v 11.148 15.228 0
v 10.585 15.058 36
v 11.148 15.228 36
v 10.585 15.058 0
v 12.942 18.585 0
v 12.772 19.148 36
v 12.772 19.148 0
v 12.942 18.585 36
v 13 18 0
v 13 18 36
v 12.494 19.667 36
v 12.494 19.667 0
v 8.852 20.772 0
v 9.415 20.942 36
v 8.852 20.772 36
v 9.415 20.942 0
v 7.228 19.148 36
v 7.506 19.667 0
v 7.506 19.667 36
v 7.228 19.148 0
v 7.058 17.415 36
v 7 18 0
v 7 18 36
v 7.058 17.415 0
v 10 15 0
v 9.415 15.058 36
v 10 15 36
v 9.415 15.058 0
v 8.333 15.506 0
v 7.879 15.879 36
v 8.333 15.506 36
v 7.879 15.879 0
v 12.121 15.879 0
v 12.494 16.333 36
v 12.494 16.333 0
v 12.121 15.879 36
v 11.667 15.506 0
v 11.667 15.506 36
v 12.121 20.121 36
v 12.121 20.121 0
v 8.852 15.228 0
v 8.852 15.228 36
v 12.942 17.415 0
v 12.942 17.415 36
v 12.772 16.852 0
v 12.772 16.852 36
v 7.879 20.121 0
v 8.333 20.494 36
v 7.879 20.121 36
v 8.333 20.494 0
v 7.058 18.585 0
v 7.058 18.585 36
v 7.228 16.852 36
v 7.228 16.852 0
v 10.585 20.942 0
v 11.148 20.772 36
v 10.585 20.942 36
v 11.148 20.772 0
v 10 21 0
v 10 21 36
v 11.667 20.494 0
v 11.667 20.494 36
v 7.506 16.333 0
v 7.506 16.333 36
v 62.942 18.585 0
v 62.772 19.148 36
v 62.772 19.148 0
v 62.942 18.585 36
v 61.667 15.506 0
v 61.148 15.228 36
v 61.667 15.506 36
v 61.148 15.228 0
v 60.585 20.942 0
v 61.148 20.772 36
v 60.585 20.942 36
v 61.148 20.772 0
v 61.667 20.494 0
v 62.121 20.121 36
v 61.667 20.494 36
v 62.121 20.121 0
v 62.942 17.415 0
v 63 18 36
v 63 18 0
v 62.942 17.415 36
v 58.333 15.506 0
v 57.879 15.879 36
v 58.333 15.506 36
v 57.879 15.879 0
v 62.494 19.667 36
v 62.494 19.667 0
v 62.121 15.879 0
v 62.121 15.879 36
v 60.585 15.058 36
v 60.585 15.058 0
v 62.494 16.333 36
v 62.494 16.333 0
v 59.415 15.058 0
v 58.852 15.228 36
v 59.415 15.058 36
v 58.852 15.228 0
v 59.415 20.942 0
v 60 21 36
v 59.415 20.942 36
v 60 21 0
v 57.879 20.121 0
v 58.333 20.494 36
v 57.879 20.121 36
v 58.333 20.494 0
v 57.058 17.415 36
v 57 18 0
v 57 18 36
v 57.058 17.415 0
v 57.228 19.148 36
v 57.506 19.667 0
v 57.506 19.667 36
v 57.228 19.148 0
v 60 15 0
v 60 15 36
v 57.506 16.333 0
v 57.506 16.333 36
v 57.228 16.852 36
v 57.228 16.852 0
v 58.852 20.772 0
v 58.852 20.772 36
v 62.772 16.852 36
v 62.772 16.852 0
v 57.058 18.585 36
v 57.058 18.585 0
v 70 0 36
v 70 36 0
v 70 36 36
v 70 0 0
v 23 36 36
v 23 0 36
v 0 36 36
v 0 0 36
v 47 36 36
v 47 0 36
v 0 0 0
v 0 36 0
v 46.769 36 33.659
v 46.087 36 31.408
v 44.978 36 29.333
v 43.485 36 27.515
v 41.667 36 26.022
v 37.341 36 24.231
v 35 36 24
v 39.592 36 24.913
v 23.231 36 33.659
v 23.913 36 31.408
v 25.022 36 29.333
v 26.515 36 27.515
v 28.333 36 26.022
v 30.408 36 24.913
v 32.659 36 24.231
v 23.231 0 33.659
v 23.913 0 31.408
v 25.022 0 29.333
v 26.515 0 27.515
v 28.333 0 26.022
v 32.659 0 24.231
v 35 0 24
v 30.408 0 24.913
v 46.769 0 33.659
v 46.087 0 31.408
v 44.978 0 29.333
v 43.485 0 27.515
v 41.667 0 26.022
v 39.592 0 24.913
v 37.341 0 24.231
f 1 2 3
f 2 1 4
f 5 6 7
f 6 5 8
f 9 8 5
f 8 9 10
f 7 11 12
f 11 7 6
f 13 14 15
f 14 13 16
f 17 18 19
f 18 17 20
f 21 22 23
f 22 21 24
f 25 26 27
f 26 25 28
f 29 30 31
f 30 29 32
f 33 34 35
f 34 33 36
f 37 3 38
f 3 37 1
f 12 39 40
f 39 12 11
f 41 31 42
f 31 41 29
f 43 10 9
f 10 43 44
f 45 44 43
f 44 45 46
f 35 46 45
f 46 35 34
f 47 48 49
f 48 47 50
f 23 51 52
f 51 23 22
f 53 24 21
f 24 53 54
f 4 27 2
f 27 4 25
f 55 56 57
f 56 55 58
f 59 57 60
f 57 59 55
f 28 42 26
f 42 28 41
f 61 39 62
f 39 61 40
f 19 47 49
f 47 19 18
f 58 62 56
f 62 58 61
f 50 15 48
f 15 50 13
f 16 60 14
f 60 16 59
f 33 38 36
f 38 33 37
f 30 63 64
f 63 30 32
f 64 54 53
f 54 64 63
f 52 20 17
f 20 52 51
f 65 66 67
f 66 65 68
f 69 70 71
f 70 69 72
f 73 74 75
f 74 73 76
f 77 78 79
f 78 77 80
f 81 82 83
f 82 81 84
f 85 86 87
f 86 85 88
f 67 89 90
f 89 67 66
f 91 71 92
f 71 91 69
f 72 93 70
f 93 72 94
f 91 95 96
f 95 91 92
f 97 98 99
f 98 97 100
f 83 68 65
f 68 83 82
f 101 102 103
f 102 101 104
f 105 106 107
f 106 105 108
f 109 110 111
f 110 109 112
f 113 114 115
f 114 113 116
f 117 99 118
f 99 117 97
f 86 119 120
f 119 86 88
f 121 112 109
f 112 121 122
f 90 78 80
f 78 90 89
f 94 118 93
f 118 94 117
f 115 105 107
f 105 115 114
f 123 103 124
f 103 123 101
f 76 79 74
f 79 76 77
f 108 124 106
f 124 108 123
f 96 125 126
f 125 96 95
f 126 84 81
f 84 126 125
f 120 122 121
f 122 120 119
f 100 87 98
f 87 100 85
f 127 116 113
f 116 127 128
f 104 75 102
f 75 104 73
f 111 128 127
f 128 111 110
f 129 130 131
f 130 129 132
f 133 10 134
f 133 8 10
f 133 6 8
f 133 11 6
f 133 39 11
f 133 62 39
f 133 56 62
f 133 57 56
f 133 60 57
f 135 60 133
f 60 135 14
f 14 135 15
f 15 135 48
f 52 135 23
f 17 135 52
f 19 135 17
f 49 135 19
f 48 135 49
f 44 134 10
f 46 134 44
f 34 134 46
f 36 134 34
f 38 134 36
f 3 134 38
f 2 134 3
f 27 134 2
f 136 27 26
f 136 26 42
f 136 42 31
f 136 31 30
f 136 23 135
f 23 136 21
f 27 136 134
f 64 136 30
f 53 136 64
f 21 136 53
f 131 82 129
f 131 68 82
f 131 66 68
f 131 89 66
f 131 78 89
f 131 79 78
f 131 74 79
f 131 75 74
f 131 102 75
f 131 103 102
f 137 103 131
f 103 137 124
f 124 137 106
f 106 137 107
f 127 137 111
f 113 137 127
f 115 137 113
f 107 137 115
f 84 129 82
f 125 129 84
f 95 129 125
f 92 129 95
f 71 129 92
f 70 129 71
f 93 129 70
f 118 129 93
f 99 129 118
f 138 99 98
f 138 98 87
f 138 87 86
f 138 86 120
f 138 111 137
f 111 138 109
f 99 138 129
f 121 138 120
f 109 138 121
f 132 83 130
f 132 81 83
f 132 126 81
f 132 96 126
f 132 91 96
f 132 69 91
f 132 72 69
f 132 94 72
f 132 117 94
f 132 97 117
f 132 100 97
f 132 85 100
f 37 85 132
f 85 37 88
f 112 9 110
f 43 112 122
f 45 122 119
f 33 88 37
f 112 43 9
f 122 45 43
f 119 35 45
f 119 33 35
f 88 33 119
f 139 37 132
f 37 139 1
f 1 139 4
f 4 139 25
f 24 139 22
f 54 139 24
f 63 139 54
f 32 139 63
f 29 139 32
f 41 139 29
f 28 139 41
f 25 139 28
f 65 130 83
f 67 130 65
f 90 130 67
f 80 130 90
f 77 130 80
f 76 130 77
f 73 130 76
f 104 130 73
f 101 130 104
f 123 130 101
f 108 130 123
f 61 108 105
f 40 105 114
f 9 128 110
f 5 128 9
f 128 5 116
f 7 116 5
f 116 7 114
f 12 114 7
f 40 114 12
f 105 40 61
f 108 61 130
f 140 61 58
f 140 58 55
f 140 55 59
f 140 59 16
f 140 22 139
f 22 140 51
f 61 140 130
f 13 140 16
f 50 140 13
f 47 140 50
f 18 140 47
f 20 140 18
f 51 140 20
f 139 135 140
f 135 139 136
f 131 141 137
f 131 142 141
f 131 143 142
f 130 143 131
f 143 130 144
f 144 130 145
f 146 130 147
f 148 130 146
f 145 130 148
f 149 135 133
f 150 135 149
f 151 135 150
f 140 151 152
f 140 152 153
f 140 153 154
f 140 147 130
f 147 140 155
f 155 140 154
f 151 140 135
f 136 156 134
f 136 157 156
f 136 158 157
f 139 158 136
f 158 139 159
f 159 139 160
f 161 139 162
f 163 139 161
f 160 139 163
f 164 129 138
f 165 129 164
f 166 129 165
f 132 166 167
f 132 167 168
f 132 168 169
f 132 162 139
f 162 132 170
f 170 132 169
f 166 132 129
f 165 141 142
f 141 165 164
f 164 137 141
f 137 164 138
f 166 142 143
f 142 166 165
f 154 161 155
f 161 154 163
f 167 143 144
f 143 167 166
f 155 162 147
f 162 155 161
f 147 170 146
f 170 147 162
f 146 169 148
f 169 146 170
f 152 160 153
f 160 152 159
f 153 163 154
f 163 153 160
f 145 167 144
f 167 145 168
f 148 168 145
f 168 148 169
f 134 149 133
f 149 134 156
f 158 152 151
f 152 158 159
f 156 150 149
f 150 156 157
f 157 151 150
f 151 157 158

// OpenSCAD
$fn = 32;

// ----------------------------------------------------------------------
// Saddle clamp: plain shaft clamp
// ----------------------------------------------------------------------

// --- parameters (mm) ---
blk_l = 70;               // block length, X
blk_w = 36;               // block width, Y
blk_h = 36;               // block height
clamp_r = 12;             // shaft groove radius
hole_r = 3;               // bolt hole radius
hole_m = 10;              // bolt hole margin from the ends
fit_tol = 0.02;           // tolerance for press fits, mm
free_tol = 0.2;           // tolerance for clearance fits, mm

saw_depth = clamp_r + 3;  // saw kerf depth

difference() {
  cube([blk_l, blk_w, blk_h]);
  translate([blk_l / 2, -1, blk_h])
    rotate([-90, 0, 0])
      cylinder(h = blk_w + 2, r = clamp_r);
  for (sx = [0, 1])
    translate([sx ? blk_l - hole_m : hole_m, blk_w / 2, -1])
      cylinder(r = hole_r, h = blk_h + 2);
}
